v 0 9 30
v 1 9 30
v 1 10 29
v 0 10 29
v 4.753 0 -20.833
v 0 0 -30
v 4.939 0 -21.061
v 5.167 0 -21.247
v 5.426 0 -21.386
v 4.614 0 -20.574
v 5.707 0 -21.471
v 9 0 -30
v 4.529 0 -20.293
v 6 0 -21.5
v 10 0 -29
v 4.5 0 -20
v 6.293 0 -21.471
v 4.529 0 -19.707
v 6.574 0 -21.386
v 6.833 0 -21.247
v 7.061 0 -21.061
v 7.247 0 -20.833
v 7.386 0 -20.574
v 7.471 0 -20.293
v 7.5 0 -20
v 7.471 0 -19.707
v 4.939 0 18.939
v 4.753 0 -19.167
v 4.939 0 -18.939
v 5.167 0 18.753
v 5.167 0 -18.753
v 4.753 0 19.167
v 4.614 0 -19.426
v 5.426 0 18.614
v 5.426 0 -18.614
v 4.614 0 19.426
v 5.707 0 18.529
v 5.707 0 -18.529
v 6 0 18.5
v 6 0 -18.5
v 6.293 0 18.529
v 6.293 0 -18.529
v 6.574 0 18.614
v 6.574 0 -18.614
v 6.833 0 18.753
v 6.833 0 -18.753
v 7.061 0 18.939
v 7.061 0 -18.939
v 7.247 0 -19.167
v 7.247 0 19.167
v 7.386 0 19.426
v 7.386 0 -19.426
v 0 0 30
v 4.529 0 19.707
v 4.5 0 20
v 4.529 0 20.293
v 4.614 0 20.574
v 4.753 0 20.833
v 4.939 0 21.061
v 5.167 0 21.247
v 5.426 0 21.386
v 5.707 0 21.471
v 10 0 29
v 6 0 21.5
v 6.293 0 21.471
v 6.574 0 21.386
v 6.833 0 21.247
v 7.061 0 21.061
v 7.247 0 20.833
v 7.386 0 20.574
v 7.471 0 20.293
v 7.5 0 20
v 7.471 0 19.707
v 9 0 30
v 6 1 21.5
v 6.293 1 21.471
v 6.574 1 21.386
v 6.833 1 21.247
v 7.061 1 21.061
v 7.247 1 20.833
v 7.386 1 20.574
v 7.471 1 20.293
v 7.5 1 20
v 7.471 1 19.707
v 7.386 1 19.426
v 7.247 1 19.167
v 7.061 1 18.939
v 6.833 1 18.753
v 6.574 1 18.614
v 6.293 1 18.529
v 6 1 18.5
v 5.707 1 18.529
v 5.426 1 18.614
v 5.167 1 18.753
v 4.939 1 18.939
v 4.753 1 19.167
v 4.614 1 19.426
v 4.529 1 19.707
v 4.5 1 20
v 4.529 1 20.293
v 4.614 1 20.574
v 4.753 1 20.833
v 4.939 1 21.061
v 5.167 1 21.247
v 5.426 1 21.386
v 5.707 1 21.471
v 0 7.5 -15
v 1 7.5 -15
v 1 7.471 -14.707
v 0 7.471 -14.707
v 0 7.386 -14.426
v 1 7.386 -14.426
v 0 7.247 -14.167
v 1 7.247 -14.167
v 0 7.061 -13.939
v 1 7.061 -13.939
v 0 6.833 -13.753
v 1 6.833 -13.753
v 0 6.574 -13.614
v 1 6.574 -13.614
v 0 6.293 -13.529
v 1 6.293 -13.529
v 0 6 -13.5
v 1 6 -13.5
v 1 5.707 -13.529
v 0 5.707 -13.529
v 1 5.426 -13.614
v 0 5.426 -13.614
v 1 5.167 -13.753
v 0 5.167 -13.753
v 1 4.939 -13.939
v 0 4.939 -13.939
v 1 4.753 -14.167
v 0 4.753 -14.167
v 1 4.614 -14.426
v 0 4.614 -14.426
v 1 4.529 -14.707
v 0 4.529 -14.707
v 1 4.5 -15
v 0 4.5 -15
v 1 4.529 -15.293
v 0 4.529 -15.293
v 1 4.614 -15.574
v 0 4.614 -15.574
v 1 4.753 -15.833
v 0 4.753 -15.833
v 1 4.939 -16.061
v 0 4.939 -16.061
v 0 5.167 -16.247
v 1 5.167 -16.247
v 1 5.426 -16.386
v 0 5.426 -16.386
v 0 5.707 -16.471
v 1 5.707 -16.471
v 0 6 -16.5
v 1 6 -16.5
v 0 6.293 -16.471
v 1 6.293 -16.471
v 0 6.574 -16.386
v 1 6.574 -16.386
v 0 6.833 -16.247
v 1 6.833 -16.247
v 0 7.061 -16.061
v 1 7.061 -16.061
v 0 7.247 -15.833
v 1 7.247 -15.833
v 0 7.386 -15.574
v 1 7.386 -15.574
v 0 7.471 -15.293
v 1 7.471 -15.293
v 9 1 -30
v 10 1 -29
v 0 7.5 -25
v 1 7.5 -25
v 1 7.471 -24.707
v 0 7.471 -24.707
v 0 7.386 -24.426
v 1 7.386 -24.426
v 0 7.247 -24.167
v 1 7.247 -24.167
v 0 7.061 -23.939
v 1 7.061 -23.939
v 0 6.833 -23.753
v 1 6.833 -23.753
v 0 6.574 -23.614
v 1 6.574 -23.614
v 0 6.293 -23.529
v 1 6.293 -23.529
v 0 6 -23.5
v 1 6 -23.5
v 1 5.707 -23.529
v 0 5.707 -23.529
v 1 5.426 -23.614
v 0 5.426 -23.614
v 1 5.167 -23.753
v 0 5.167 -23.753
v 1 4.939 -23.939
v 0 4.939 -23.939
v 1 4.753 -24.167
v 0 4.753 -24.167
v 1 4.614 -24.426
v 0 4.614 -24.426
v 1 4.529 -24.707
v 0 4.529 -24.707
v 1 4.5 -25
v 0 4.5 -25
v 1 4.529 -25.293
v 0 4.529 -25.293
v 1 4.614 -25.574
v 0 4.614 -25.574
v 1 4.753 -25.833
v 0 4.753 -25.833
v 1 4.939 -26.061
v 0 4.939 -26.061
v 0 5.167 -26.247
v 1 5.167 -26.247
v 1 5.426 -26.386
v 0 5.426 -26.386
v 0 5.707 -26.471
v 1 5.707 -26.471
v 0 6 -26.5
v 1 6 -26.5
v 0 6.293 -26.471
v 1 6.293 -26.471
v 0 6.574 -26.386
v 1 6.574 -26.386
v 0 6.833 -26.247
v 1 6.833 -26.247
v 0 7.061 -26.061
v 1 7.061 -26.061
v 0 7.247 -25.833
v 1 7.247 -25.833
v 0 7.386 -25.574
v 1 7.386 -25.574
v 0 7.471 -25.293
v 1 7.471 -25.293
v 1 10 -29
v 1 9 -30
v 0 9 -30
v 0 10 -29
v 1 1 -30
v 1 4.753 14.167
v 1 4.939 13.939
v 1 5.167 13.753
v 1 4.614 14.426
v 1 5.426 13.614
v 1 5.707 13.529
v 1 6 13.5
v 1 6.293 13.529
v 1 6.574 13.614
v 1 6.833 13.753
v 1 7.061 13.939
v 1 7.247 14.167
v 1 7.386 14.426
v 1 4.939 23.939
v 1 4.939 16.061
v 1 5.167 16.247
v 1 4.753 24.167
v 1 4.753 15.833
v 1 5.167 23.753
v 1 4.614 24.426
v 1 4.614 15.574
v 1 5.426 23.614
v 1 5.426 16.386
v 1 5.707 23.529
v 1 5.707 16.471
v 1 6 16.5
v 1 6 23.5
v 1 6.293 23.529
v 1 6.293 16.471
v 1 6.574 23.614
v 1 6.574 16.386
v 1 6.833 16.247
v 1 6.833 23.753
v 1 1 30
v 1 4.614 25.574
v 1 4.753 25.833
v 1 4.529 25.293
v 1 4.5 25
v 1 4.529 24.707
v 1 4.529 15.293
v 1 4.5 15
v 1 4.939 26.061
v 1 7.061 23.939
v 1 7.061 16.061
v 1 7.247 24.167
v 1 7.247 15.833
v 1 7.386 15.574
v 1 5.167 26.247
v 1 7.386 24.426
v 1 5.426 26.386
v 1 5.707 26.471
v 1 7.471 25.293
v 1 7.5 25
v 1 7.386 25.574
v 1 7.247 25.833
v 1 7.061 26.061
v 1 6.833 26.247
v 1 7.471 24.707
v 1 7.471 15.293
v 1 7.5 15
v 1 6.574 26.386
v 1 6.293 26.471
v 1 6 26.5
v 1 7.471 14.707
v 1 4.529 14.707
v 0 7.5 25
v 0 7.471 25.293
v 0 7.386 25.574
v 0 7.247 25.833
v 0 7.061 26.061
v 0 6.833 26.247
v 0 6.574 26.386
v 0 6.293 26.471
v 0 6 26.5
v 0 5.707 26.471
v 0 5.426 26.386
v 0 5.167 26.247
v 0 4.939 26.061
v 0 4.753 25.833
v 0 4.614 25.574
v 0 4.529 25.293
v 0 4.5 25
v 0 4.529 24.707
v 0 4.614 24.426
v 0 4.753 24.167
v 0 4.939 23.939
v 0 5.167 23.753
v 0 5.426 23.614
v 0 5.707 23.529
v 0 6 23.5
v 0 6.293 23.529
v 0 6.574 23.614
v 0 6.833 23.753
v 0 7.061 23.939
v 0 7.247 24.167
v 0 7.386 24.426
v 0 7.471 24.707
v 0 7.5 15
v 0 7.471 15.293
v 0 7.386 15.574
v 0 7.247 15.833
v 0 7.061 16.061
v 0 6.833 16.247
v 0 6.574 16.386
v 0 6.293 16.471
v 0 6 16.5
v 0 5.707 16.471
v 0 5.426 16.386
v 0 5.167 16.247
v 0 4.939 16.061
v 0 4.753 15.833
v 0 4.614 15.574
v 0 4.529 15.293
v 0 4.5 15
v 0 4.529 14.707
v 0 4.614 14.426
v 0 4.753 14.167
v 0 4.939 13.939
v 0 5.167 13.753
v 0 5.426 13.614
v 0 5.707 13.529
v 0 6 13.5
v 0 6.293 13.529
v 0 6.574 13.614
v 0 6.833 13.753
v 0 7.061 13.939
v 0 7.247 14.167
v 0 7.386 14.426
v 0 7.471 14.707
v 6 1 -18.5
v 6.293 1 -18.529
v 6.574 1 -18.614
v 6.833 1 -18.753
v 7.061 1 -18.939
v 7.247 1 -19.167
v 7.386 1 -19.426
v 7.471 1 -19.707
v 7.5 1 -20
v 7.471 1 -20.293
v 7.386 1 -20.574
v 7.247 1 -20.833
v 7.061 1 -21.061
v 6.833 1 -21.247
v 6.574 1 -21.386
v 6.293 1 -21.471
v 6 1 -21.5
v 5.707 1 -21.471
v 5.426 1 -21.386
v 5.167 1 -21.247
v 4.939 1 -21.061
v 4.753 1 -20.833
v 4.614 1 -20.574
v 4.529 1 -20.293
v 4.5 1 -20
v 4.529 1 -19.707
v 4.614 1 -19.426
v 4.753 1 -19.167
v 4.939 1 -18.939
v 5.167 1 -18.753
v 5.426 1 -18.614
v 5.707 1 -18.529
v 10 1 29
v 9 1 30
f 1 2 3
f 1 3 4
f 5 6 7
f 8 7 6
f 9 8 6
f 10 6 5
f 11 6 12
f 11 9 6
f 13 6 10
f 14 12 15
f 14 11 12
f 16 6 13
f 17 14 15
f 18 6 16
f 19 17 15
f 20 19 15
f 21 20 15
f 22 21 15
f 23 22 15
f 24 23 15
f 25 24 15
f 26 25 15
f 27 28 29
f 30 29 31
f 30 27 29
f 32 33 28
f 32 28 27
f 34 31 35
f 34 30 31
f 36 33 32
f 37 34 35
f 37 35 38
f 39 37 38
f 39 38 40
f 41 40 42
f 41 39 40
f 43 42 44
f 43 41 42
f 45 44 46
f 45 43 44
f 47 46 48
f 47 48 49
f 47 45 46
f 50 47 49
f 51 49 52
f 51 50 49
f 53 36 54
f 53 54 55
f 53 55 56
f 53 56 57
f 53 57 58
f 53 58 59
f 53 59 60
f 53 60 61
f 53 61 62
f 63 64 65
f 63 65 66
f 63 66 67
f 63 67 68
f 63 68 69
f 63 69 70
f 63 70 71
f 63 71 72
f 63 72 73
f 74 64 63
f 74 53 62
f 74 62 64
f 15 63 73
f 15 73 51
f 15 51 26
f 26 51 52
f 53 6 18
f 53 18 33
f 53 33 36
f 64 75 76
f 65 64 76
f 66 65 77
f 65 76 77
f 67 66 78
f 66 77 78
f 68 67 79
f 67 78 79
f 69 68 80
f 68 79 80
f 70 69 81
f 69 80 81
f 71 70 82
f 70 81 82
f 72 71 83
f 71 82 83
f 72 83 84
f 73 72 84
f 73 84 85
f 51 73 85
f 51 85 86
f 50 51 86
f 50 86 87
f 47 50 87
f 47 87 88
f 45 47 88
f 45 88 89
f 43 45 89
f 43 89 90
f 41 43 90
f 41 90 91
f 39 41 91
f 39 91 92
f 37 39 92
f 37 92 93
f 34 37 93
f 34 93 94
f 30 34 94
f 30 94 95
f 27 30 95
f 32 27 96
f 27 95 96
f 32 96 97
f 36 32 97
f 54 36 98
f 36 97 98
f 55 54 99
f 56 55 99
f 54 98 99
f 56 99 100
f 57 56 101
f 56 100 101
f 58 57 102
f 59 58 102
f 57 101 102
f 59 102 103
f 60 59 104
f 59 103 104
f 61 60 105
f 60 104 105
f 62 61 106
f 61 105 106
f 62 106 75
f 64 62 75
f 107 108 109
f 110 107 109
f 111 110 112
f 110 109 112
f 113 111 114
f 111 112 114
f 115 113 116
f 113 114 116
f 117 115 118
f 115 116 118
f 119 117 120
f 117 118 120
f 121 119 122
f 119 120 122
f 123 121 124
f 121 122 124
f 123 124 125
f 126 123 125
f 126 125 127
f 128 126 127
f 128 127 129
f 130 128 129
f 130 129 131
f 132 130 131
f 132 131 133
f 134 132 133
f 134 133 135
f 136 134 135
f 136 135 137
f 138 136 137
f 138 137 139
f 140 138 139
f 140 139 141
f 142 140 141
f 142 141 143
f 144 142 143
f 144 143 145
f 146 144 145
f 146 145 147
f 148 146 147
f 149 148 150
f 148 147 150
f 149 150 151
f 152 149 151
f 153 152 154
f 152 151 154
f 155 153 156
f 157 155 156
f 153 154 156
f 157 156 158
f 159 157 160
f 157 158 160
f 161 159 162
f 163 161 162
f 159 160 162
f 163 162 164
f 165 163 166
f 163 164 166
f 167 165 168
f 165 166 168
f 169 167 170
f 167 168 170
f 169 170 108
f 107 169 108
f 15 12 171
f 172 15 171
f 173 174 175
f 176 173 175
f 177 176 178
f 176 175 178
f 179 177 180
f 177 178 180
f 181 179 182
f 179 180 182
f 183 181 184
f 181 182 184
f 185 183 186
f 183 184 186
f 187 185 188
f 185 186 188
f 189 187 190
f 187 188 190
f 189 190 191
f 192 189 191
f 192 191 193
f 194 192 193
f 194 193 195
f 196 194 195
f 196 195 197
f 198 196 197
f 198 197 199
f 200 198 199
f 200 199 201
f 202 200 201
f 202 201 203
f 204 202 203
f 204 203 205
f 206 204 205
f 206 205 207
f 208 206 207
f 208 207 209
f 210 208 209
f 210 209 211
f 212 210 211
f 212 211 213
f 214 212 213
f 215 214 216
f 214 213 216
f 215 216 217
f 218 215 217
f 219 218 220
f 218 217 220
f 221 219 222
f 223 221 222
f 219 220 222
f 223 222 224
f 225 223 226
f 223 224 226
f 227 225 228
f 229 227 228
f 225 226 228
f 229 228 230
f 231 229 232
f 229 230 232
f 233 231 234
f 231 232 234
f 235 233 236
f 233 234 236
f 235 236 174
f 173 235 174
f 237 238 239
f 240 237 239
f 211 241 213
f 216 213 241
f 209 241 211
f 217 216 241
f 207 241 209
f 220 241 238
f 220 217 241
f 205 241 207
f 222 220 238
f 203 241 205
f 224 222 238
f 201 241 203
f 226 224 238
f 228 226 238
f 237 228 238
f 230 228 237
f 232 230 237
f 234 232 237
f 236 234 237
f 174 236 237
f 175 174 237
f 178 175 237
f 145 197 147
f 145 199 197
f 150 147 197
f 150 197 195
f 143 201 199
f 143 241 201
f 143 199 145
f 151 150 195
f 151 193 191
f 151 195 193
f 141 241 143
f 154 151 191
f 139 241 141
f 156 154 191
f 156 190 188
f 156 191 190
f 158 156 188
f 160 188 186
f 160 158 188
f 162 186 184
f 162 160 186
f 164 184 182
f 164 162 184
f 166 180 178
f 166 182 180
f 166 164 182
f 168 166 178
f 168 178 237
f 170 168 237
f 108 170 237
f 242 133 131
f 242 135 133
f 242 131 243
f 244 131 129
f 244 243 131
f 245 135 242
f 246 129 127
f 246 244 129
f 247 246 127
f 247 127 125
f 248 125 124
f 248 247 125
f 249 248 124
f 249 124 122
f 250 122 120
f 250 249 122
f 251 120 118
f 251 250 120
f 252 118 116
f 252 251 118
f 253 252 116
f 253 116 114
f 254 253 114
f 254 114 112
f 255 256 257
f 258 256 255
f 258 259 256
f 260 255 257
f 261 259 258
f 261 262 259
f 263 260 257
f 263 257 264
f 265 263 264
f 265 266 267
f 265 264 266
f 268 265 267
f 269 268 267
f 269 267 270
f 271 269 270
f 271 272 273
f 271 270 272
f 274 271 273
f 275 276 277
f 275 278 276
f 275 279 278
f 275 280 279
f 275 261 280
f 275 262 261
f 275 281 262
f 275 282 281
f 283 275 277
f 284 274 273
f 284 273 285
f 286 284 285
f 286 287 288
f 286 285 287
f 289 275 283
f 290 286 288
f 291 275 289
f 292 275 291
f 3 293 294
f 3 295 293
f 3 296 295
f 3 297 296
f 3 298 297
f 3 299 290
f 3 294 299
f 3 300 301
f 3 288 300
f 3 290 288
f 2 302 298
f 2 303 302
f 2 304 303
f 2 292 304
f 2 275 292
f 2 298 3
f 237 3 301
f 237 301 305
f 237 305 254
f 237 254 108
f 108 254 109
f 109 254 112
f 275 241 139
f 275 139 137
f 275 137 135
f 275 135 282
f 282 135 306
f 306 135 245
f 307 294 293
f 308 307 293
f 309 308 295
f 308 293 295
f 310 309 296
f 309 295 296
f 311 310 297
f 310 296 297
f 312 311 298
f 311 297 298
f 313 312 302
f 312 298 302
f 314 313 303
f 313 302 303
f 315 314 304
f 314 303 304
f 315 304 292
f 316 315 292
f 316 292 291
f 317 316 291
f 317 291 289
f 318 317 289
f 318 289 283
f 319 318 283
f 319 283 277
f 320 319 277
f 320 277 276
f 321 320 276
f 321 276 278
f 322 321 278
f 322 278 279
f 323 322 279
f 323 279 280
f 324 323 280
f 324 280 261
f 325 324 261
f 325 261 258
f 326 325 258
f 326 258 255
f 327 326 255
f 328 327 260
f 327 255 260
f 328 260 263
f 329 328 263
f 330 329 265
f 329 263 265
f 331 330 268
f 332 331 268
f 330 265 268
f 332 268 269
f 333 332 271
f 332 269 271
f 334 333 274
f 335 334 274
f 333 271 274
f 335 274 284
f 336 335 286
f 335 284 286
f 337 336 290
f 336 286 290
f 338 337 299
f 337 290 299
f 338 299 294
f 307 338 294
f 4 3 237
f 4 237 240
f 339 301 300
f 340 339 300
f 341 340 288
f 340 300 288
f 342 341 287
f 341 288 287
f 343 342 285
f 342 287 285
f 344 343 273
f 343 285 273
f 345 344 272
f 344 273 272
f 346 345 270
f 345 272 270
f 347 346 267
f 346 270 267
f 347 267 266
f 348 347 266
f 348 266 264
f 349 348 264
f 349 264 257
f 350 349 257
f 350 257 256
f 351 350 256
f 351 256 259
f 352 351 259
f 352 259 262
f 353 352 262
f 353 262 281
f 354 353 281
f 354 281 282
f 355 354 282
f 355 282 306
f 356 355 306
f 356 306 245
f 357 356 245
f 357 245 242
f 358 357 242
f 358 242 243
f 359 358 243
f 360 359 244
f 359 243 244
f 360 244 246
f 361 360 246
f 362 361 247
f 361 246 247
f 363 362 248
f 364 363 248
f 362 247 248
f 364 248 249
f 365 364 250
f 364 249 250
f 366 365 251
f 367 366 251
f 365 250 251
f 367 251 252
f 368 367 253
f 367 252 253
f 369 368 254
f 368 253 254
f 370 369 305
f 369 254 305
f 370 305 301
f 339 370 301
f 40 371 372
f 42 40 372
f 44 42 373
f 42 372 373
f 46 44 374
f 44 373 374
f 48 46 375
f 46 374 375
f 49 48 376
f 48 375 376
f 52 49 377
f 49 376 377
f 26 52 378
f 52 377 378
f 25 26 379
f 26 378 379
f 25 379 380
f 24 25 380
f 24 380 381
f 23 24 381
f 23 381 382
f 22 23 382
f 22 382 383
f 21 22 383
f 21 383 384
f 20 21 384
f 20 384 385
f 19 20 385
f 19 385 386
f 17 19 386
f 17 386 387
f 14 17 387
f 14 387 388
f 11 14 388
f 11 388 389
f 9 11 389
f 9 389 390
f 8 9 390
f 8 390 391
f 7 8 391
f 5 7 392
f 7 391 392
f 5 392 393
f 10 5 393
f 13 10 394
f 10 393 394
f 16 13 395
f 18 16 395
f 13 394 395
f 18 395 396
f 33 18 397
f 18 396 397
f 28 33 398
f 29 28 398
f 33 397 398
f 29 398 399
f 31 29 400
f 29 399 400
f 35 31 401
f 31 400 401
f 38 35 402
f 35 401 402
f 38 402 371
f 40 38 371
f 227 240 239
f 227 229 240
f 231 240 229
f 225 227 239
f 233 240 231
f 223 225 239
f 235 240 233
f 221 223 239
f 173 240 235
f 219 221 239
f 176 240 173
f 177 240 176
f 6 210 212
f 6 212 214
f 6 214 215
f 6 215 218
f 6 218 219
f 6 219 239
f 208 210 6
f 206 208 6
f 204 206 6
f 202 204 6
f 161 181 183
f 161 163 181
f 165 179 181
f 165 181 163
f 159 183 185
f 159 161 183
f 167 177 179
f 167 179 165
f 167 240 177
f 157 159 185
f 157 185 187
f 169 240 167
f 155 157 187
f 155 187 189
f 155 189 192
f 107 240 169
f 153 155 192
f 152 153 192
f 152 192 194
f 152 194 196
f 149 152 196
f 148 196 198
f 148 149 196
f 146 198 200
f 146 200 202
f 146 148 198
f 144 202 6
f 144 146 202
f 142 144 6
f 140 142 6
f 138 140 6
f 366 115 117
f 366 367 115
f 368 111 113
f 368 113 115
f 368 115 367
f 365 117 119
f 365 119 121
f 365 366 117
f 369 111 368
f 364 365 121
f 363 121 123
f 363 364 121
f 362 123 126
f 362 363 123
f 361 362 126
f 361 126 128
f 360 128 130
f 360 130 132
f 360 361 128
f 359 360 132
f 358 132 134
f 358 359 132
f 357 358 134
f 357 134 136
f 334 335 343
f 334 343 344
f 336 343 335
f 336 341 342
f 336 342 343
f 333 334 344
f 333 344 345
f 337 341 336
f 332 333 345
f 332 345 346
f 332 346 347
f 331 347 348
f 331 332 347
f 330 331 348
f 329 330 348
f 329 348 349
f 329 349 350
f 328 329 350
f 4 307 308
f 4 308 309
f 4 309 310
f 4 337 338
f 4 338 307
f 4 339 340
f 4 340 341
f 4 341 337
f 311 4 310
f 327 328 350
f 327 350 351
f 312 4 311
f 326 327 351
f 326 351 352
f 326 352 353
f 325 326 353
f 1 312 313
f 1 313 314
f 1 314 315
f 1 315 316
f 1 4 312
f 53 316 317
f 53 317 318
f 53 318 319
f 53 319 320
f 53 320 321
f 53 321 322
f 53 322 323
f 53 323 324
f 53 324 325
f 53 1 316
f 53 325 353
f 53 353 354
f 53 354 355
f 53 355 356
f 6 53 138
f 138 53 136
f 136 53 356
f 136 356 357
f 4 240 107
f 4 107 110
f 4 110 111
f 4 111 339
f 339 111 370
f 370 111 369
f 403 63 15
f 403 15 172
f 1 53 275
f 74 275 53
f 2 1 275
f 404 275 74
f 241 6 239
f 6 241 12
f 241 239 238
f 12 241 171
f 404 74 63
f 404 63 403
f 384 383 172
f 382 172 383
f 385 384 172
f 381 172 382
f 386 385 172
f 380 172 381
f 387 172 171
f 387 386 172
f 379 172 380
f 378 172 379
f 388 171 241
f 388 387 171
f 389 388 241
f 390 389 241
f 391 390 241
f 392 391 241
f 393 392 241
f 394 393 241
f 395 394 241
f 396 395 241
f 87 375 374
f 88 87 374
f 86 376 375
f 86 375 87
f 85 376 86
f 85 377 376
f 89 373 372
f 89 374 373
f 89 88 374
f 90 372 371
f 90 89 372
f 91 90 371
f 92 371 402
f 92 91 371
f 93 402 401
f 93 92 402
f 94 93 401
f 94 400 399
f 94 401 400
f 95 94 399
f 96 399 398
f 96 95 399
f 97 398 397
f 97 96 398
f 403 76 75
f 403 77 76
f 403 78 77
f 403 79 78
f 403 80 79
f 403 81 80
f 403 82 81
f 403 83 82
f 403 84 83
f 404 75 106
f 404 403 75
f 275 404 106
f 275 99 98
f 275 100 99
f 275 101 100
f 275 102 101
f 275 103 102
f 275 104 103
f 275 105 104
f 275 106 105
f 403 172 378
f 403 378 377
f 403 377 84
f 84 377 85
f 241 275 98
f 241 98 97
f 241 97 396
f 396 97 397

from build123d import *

# Parameters (mm, degrees)
LINEAR_AUSTRAGEN_D_NN1_DEPTH    = 30
FASE1_SIZE                      = 1
SKIZZE2_R                       = 1.5
SCHNITT_LINEAR_AUSTRAGEN1_DEPTH = 10
SKIZZE3_R                       = 1.5
SCHNITT_LINEAR_AUSTRAGEN2_DEPTH = 10


with BuildPart() as part:
    # Skizze1 → Linear-Austragen-Dünn1 (new, symmetric)
    with BuildSketch(Plane.XY):
        Polygon((0, 10), (0, 0), (10, 0), (10, 1), (1, 1), (1, 10), align=None)
    extrude(amount=LINEAR_AUSTRAGEN_D_NN1_DEPTH, both=True)

    # Fase1
    fase1_edges = [part.edges().sort_by_distance(p)[0] for p in [
        (0.5, 10, 30),
        (0.5, 10, -30),
        (10, 0.5, -30),
        (10, 0.5, 30),
    ]]
    chamfer(fase1_edges, length=FASE1_SIZE)

    # Skizze2 → Schnitt-Linear austragen1 (cut)
    with BuildSketch(Plane(origin=(1, 0, 0), x_dir=(0, 0, -1), z_dir=(1, 0, 0))):
        with Locations(Location((-15, 6, 0), (0, 0, 90))):
            Circle(SKIZZE2_R)
        with Locations(Location((15, 6, 0), (0, 0, 90))):
            Circle(SKIZZE2_R)
        with Locations(Location((-25, 6, 0), (0, 0, 90))):
            Circle(SKIZZE2_R)
        with Locations(Location((25, 6, 0), (0, 0, 90))):
            Circle(SKIZZE2_R)
    extrude(amount=-SCHNITT_LINEAR_AUSTRAGEN1_DEPTH, mode=Mode.SUBTRACT)

    # Skizze3 → Schnitt-Linear austragen2 (cut)
    with BuildSketch(Plane(origin=(0, 1, 0), x_dir=(1, 0, 0), z_dir=(0, 1, 0))):
        with Locations(Location((6, -20, 0), (0, 0, 270))):
            Circle(SKIZZE3_R)
        with Locations(Location((6, 20, 0), (0, 0, 270))):
            Circle(SKIZZE3_R)
    extrude(amount=-SCHNITT_LINEAR_AUSTRAGEN2_DEPTH, mode=Mode.SUBTRACT)


solid = part.part
